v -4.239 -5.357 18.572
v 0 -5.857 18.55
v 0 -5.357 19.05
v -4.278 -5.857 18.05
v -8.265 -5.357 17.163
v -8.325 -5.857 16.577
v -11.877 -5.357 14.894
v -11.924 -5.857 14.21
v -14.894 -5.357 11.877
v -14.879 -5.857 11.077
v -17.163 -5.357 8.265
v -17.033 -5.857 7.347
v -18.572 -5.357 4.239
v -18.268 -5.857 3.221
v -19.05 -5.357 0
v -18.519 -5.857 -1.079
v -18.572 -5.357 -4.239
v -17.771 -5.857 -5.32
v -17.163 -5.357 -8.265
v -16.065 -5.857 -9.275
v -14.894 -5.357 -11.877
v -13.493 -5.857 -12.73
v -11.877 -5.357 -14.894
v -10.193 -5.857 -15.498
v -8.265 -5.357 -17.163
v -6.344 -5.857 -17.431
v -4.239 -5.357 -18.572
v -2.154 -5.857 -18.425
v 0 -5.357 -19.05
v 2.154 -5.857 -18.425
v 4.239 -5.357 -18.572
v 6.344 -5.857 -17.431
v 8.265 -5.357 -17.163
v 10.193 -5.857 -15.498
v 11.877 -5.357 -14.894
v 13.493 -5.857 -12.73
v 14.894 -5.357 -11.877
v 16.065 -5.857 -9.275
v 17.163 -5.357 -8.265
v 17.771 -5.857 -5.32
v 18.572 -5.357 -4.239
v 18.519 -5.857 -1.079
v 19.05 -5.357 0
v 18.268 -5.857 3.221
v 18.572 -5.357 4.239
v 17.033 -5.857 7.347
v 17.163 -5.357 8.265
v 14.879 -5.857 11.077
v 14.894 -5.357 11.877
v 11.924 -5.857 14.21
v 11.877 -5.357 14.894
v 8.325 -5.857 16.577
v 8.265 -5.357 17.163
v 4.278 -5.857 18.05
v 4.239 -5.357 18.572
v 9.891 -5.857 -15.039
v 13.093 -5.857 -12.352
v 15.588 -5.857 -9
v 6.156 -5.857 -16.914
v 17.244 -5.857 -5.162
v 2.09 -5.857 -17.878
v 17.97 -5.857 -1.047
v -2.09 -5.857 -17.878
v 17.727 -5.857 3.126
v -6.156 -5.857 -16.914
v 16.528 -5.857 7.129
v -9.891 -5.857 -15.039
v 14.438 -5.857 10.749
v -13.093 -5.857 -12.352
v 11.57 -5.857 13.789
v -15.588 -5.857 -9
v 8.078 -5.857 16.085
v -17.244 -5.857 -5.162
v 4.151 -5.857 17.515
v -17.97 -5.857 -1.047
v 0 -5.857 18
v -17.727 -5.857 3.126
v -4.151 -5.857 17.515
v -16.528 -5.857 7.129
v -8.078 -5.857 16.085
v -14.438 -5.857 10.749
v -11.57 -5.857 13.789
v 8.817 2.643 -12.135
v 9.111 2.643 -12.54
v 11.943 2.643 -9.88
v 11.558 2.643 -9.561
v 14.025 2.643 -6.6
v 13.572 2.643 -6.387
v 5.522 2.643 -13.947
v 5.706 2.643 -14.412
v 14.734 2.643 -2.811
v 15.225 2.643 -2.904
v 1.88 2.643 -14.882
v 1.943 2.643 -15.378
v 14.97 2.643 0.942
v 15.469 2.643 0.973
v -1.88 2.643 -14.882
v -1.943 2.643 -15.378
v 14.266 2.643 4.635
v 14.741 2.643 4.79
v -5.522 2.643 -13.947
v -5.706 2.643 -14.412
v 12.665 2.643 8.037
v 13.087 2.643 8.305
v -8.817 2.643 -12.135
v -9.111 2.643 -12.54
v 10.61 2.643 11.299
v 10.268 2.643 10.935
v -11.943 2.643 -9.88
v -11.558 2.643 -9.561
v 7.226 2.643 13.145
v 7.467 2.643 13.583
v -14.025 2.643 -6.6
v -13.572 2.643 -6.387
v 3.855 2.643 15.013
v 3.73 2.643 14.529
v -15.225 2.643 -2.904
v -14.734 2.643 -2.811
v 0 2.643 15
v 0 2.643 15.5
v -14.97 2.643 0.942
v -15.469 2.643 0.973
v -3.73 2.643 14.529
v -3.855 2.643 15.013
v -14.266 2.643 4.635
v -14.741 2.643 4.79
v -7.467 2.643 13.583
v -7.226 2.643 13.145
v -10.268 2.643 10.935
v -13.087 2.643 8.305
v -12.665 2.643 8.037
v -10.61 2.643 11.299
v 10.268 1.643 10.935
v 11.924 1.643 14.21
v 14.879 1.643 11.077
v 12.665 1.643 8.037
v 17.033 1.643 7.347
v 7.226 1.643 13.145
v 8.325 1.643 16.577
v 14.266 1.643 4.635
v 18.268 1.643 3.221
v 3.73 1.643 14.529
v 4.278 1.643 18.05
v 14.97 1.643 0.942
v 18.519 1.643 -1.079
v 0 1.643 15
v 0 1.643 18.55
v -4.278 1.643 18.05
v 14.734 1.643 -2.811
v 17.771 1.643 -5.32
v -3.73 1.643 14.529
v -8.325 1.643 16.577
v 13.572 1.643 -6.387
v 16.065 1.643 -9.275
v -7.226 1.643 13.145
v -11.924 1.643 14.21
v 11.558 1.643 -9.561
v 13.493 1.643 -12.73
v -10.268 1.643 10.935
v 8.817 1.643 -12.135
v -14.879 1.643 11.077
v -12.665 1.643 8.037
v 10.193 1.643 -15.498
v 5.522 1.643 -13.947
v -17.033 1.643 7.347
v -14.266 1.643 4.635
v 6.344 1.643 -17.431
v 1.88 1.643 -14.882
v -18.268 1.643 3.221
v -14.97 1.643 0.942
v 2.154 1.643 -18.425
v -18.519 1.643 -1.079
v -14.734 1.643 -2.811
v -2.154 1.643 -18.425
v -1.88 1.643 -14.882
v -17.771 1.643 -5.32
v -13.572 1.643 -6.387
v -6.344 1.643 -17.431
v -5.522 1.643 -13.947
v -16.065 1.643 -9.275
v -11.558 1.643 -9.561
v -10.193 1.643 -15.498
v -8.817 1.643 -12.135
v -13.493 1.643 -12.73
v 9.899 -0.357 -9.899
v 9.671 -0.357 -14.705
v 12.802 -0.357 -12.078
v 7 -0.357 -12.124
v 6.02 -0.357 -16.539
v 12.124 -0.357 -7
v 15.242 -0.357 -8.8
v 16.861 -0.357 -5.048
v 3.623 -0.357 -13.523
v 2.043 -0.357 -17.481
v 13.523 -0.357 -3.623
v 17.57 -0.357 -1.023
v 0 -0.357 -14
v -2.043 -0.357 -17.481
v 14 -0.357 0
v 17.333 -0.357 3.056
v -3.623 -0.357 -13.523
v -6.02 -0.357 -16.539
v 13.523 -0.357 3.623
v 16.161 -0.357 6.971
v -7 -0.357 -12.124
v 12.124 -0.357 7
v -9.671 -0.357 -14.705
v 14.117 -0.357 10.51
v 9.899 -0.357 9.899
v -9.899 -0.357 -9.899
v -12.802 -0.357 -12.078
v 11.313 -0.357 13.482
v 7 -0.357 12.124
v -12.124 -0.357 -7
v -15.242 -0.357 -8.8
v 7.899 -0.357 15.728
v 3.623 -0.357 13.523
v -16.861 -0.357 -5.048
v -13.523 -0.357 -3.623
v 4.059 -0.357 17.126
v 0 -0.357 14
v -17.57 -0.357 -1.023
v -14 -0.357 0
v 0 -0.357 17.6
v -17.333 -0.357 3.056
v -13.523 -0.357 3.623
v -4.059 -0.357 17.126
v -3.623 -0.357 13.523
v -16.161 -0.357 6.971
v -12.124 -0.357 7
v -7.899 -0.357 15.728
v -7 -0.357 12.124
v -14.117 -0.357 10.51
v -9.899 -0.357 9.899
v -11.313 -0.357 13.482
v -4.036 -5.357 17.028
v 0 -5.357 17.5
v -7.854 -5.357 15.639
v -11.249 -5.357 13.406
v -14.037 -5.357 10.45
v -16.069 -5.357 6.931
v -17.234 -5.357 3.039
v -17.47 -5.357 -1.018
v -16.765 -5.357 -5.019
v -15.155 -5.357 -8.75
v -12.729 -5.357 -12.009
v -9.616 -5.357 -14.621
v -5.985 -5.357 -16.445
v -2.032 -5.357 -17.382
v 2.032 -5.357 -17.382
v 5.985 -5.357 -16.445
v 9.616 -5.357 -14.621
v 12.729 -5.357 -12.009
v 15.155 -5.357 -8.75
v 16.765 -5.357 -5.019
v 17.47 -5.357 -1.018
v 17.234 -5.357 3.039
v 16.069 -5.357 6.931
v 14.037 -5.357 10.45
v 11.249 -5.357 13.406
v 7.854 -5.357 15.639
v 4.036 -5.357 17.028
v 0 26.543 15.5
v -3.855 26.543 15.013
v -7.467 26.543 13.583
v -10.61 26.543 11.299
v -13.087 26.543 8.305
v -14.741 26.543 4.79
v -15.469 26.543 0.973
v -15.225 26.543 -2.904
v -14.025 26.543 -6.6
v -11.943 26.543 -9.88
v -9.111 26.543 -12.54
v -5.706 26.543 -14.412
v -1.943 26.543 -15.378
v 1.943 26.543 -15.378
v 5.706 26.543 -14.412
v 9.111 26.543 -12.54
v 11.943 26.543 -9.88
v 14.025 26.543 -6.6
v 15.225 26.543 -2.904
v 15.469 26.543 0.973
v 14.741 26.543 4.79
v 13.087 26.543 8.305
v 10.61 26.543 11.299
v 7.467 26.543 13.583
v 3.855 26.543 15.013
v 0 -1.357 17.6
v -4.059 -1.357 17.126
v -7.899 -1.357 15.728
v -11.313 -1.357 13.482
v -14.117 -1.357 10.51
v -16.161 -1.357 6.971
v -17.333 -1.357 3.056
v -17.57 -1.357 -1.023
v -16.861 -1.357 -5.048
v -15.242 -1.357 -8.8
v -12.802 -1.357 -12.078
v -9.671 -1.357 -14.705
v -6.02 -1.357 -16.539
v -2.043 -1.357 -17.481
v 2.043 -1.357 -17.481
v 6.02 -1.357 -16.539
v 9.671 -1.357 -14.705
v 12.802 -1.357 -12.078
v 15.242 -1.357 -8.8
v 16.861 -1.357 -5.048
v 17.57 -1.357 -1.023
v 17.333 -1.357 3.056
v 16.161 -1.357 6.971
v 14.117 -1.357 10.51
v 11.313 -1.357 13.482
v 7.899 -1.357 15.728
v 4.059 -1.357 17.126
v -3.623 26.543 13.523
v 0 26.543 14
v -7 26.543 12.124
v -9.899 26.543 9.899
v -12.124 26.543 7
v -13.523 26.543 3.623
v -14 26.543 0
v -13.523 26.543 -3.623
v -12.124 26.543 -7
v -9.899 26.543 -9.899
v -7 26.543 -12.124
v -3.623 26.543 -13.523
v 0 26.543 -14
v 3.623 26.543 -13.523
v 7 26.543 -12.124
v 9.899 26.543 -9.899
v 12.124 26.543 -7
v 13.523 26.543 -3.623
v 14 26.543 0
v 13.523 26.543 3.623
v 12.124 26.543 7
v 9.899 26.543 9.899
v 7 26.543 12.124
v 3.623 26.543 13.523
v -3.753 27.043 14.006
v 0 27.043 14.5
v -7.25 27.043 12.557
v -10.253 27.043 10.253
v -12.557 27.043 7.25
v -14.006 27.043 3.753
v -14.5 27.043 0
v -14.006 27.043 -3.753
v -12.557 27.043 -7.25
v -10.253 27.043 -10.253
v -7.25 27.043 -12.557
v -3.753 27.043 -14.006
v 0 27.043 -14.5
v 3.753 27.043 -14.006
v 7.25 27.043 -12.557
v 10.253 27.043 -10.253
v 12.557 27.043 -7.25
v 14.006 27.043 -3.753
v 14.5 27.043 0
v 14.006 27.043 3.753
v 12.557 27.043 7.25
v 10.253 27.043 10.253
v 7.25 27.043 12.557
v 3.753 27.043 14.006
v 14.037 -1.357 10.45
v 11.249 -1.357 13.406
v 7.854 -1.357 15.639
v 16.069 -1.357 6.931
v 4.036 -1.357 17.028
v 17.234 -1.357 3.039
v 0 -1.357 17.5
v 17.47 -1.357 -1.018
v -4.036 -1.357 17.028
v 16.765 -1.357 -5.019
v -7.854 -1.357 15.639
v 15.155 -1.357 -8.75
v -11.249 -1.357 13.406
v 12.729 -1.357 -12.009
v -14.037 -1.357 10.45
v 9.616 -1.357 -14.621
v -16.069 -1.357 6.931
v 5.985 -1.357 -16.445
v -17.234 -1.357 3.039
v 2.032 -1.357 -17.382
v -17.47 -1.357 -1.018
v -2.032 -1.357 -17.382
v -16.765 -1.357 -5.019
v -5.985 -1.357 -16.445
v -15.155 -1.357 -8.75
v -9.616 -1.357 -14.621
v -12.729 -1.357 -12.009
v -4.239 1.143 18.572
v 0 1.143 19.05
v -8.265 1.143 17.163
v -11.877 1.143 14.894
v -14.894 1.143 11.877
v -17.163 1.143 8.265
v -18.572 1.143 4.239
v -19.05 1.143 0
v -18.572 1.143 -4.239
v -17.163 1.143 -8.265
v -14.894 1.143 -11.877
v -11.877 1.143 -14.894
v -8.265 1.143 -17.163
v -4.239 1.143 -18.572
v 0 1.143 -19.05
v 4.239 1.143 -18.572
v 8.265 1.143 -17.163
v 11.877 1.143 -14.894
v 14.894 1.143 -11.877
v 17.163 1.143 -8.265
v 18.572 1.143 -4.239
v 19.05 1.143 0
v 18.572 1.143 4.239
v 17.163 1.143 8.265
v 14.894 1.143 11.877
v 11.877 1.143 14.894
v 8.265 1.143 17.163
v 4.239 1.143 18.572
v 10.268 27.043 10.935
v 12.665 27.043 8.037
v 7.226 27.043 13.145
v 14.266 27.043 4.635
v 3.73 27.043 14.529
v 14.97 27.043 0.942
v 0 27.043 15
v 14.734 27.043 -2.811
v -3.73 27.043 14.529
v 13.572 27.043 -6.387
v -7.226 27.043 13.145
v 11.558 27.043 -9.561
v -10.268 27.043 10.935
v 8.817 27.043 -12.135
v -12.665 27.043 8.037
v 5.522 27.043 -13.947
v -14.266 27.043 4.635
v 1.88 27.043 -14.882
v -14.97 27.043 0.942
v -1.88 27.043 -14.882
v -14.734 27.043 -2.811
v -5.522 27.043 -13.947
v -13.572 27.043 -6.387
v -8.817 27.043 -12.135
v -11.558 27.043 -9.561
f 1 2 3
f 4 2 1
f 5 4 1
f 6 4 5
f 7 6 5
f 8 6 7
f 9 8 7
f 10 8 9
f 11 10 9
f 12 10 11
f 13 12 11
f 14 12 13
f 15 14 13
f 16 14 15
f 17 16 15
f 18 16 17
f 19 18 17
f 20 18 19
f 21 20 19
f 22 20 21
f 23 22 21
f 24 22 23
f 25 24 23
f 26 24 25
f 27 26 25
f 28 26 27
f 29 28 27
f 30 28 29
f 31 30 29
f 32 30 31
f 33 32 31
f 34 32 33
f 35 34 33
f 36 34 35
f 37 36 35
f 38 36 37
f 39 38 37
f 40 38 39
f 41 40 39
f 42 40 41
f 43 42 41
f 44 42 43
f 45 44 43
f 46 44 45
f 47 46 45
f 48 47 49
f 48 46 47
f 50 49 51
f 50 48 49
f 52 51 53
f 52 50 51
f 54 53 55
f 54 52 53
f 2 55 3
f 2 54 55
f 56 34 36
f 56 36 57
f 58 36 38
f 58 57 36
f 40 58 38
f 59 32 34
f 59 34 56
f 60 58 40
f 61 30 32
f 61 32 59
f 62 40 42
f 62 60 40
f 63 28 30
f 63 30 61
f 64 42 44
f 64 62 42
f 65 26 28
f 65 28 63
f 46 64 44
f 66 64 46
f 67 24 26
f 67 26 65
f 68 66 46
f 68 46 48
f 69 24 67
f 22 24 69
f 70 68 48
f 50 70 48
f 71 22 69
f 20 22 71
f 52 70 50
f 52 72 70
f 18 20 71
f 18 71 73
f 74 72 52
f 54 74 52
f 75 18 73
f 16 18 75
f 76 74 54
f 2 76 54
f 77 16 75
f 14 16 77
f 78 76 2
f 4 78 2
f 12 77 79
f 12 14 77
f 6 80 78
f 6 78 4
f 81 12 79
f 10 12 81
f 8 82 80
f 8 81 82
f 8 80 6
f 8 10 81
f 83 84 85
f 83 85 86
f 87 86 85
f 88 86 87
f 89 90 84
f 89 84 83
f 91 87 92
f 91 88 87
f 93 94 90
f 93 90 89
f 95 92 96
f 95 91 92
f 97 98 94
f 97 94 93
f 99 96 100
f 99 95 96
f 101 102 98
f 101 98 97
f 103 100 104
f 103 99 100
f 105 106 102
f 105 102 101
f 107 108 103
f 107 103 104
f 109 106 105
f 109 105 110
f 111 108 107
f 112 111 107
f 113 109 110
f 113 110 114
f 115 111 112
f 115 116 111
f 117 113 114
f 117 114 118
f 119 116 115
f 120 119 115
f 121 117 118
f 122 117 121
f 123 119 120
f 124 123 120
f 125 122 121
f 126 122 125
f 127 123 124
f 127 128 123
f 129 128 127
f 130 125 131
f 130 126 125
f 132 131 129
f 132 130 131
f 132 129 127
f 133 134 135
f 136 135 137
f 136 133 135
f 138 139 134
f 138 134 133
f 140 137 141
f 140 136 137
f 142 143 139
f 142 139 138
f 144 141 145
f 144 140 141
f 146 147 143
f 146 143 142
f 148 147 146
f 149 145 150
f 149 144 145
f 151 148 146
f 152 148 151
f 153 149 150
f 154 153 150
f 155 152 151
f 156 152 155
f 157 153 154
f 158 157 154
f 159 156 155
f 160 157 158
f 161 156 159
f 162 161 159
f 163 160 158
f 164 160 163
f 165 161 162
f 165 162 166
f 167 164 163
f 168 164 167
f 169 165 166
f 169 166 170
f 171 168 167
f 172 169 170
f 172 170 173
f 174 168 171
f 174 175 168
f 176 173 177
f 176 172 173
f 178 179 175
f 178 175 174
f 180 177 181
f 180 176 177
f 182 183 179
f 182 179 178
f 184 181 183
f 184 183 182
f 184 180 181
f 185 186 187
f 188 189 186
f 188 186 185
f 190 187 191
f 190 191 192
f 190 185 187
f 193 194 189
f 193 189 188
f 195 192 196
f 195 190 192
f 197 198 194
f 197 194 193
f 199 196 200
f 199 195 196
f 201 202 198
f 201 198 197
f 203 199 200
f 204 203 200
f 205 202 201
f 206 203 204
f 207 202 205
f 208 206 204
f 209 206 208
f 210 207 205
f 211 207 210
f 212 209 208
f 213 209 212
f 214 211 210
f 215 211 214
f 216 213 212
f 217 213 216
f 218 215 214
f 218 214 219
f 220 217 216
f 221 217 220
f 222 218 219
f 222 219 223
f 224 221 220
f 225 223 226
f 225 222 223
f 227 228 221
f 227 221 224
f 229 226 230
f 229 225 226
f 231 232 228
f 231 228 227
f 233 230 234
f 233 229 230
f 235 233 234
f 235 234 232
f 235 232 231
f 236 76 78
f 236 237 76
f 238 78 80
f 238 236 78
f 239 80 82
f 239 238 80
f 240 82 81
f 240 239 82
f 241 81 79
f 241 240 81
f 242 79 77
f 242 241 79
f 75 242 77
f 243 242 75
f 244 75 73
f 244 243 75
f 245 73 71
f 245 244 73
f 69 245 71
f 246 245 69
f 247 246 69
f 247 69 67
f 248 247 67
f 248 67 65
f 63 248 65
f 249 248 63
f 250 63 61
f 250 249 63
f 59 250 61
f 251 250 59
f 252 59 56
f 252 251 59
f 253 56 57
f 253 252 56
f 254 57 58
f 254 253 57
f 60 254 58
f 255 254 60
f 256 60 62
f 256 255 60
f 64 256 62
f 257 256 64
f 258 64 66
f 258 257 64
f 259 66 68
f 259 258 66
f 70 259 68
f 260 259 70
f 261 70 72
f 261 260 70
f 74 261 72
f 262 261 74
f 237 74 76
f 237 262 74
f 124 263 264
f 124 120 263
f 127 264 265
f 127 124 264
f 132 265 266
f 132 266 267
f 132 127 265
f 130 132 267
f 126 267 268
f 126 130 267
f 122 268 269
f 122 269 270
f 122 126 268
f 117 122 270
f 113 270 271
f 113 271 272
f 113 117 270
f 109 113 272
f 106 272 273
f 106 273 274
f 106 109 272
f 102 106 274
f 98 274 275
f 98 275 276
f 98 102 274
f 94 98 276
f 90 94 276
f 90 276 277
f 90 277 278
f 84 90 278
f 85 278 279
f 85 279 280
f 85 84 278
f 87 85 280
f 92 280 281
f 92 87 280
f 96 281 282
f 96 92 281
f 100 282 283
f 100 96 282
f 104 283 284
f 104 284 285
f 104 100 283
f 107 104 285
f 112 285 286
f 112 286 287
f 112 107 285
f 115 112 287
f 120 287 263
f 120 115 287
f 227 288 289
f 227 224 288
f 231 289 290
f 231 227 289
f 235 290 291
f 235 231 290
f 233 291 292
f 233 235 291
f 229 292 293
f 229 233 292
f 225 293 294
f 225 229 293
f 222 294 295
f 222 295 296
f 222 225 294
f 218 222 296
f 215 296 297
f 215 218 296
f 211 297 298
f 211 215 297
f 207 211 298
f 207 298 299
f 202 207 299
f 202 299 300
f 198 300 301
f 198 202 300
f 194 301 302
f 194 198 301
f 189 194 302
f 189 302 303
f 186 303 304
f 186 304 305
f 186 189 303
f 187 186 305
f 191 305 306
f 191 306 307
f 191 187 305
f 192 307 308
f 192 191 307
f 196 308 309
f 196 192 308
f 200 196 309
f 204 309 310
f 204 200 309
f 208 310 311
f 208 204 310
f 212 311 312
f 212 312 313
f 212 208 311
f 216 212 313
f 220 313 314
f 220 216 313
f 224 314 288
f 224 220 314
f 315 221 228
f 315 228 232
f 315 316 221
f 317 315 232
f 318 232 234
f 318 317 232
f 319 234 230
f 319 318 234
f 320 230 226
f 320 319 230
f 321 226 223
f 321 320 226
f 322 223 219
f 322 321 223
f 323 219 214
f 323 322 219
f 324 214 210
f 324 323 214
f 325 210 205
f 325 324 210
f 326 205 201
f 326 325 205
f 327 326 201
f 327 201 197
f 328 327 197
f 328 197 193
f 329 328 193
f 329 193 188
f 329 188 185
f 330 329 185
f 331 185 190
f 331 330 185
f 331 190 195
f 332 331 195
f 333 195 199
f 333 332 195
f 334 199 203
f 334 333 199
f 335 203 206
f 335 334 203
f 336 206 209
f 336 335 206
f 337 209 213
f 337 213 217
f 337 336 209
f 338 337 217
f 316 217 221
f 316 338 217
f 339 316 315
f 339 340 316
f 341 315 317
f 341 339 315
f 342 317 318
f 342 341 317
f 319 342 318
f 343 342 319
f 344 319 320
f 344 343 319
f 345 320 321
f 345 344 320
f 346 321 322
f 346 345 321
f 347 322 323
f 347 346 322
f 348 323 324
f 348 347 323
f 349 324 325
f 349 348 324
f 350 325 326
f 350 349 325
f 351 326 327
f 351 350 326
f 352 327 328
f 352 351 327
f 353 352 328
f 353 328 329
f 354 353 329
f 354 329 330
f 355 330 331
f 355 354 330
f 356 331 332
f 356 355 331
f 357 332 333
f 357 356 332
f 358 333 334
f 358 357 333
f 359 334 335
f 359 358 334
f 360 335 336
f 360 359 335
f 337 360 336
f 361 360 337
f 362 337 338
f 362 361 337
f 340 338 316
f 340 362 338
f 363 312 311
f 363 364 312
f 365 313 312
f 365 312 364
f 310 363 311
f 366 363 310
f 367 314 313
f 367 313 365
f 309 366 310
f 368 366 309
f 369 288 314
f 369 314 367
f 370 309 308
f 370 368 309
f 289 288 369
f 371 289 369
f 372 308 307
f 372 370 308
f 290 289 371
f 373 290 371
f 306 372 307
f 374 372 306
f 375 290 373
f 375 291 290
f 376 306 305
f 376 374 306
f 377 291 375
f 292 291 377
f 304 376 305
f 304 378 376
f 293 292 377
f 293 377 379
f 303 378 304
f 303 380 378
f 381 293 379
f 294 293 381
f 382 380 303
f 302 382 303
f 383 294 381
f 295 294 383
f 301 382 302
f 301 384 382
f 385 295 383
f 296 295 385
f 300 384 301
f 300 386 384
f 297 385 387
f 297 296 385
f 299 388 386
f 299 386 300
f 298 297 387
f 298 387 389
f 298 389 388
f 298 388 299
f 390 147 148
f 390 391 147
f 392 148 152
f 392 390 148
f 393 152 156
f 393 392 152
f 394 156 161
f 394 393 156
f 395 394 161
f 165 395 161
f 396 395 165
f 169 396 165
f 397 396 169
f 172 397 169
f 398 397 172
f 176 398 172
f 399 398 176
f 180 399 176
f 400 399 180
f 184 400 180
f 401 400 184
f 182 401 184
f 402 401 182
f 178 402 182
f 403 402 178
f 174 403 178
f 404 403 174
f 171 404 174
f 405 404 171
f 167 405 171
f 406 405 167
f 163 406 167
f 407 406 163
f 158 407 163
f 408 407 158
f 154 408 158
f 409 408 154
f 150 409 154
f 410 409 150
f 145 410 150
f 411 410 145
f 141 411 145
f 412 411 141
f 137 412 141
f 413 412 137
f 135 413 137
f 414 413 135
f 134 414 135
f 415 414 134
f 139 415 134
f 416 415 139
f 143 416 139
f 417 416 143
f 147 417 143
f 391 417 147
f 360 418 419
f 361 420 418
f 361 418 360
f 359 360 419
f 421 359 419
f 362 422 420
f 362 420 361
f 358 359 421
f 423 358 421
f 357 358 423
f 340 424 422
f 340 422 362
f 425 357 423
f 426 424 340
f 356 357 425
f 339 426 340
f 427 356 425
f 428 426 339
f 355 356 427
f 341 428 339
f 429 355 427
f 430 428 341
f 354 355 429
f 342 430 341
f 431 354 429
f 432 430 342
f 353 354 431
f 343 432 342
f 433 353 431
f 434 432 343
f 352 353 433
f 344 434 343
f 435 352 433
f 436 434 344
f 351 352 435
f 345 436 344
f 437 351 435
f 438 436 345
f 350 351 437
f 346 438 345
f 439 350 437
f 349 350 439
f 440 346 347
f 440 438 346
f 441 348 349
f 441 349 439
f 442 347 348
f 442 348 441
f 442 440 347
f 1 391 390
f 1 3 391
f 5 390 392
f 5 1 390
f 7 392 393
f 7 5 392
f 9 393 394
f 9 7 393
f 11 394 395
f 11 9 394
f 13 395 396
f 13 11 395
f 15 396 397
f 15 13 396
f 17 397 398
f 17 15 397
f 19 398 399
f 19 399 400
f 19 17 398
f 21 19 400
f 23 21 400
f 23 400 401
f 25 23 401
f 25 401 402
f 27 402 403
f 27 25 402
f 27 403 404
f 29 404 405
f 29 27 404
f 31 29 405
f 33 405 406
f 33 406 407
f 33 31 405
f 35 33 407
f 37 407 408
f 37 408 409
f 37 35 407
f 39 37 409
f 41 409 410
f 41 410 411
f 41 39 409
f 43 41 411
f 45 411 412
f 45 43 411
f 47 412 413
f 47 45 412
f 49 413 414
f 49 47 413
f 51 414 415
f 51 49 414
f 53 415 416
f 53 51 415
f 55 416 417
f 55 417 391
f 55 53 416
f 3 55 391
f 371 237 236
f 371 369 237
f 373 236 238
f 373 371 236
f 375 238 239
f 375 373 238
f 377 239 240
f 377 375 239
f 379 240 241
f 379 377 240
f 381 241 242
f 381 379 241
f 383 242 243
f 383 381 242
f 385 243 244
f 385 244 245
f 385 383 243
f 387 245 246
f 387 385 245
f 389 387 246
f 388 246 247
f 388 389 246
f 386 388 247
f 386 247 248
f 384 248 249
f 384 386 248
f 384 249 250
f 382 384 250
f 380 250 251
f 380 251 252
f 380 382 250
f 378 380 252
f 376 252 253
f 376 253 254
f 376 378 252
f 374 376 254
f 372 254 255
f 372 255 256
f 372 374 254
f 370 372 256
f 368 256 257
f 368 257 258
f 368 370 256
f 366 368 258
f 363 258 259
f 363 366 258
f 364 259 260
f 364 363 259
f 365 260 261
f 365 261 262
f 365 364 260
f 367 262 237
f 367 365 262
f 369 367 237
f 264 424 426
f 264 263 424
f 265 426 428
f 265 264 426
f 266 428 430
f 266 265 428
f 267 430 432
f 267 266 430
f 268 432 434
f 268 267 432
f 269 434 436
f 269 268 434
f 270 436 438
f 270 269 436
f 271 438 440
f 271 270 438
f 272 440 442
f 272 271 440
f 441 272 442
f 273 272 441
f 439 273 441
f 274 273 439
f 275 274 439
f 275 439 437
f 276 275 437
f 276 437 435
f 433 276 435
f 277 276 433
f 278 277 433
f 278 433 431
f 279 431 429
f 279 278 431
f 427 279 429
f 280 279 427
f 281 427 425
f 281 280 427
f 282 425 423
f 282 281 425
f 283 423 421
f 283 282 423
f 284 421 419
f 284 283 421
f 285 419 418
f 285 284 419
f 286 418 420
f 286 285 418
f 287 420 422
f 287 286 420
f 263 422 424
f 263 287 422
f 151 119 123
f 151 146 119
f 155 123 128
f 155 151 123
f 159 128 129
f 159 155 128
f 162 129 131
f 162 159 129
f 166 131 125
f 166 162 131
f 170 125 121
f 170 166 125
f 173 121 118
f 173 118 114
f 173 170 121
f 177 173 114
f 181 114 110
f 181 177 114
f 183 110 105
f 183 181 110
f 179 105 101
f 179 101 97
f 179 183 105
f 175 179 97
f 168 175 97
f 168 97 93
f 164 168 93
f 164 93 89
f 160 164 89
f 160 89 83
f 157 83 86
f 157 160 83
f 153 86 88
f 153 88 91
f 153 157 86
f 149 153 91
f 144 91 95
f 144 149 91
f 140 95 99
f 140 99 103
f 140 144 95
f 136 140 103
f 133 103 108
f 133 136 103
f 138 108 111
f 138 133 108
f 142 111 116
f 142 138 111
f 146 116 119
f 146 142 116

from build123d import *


with BuildPart() as part:
    # 草图1 → 旋转2 (revolve)
    with BuildSketch(Plane.XY, mode=Mode.PRIVATE) as revolve_2_sk:
        Polygon((14.5, 27.042854175), (15, 27.042854175), (15.5, 26.542854175), (15.5, 2.642854175), (15, 2.642854175), (15, 1.642854175), (18.55, 1.642854175), (19.05, 1.142854175), (19.05, -5.357145825), (18.55, -5.857145825), (18, -5.857145825), (17.5, -5.357145825), (17.5, -1.357145825), (17.6, -1.357145825), (17.6, -0.357145825), (14, -0.357145825), (14, 26.542854175), align=None)
    revolve(revolve_2_sk.sketch.rotate(Axis((0, 44.598597745, 0), (0, -1, 0)), 90), axis=Axis((0, 44.598597745, 0), (0, -1, 0)))  # turned: the seam where the file's is


solid = part.part
